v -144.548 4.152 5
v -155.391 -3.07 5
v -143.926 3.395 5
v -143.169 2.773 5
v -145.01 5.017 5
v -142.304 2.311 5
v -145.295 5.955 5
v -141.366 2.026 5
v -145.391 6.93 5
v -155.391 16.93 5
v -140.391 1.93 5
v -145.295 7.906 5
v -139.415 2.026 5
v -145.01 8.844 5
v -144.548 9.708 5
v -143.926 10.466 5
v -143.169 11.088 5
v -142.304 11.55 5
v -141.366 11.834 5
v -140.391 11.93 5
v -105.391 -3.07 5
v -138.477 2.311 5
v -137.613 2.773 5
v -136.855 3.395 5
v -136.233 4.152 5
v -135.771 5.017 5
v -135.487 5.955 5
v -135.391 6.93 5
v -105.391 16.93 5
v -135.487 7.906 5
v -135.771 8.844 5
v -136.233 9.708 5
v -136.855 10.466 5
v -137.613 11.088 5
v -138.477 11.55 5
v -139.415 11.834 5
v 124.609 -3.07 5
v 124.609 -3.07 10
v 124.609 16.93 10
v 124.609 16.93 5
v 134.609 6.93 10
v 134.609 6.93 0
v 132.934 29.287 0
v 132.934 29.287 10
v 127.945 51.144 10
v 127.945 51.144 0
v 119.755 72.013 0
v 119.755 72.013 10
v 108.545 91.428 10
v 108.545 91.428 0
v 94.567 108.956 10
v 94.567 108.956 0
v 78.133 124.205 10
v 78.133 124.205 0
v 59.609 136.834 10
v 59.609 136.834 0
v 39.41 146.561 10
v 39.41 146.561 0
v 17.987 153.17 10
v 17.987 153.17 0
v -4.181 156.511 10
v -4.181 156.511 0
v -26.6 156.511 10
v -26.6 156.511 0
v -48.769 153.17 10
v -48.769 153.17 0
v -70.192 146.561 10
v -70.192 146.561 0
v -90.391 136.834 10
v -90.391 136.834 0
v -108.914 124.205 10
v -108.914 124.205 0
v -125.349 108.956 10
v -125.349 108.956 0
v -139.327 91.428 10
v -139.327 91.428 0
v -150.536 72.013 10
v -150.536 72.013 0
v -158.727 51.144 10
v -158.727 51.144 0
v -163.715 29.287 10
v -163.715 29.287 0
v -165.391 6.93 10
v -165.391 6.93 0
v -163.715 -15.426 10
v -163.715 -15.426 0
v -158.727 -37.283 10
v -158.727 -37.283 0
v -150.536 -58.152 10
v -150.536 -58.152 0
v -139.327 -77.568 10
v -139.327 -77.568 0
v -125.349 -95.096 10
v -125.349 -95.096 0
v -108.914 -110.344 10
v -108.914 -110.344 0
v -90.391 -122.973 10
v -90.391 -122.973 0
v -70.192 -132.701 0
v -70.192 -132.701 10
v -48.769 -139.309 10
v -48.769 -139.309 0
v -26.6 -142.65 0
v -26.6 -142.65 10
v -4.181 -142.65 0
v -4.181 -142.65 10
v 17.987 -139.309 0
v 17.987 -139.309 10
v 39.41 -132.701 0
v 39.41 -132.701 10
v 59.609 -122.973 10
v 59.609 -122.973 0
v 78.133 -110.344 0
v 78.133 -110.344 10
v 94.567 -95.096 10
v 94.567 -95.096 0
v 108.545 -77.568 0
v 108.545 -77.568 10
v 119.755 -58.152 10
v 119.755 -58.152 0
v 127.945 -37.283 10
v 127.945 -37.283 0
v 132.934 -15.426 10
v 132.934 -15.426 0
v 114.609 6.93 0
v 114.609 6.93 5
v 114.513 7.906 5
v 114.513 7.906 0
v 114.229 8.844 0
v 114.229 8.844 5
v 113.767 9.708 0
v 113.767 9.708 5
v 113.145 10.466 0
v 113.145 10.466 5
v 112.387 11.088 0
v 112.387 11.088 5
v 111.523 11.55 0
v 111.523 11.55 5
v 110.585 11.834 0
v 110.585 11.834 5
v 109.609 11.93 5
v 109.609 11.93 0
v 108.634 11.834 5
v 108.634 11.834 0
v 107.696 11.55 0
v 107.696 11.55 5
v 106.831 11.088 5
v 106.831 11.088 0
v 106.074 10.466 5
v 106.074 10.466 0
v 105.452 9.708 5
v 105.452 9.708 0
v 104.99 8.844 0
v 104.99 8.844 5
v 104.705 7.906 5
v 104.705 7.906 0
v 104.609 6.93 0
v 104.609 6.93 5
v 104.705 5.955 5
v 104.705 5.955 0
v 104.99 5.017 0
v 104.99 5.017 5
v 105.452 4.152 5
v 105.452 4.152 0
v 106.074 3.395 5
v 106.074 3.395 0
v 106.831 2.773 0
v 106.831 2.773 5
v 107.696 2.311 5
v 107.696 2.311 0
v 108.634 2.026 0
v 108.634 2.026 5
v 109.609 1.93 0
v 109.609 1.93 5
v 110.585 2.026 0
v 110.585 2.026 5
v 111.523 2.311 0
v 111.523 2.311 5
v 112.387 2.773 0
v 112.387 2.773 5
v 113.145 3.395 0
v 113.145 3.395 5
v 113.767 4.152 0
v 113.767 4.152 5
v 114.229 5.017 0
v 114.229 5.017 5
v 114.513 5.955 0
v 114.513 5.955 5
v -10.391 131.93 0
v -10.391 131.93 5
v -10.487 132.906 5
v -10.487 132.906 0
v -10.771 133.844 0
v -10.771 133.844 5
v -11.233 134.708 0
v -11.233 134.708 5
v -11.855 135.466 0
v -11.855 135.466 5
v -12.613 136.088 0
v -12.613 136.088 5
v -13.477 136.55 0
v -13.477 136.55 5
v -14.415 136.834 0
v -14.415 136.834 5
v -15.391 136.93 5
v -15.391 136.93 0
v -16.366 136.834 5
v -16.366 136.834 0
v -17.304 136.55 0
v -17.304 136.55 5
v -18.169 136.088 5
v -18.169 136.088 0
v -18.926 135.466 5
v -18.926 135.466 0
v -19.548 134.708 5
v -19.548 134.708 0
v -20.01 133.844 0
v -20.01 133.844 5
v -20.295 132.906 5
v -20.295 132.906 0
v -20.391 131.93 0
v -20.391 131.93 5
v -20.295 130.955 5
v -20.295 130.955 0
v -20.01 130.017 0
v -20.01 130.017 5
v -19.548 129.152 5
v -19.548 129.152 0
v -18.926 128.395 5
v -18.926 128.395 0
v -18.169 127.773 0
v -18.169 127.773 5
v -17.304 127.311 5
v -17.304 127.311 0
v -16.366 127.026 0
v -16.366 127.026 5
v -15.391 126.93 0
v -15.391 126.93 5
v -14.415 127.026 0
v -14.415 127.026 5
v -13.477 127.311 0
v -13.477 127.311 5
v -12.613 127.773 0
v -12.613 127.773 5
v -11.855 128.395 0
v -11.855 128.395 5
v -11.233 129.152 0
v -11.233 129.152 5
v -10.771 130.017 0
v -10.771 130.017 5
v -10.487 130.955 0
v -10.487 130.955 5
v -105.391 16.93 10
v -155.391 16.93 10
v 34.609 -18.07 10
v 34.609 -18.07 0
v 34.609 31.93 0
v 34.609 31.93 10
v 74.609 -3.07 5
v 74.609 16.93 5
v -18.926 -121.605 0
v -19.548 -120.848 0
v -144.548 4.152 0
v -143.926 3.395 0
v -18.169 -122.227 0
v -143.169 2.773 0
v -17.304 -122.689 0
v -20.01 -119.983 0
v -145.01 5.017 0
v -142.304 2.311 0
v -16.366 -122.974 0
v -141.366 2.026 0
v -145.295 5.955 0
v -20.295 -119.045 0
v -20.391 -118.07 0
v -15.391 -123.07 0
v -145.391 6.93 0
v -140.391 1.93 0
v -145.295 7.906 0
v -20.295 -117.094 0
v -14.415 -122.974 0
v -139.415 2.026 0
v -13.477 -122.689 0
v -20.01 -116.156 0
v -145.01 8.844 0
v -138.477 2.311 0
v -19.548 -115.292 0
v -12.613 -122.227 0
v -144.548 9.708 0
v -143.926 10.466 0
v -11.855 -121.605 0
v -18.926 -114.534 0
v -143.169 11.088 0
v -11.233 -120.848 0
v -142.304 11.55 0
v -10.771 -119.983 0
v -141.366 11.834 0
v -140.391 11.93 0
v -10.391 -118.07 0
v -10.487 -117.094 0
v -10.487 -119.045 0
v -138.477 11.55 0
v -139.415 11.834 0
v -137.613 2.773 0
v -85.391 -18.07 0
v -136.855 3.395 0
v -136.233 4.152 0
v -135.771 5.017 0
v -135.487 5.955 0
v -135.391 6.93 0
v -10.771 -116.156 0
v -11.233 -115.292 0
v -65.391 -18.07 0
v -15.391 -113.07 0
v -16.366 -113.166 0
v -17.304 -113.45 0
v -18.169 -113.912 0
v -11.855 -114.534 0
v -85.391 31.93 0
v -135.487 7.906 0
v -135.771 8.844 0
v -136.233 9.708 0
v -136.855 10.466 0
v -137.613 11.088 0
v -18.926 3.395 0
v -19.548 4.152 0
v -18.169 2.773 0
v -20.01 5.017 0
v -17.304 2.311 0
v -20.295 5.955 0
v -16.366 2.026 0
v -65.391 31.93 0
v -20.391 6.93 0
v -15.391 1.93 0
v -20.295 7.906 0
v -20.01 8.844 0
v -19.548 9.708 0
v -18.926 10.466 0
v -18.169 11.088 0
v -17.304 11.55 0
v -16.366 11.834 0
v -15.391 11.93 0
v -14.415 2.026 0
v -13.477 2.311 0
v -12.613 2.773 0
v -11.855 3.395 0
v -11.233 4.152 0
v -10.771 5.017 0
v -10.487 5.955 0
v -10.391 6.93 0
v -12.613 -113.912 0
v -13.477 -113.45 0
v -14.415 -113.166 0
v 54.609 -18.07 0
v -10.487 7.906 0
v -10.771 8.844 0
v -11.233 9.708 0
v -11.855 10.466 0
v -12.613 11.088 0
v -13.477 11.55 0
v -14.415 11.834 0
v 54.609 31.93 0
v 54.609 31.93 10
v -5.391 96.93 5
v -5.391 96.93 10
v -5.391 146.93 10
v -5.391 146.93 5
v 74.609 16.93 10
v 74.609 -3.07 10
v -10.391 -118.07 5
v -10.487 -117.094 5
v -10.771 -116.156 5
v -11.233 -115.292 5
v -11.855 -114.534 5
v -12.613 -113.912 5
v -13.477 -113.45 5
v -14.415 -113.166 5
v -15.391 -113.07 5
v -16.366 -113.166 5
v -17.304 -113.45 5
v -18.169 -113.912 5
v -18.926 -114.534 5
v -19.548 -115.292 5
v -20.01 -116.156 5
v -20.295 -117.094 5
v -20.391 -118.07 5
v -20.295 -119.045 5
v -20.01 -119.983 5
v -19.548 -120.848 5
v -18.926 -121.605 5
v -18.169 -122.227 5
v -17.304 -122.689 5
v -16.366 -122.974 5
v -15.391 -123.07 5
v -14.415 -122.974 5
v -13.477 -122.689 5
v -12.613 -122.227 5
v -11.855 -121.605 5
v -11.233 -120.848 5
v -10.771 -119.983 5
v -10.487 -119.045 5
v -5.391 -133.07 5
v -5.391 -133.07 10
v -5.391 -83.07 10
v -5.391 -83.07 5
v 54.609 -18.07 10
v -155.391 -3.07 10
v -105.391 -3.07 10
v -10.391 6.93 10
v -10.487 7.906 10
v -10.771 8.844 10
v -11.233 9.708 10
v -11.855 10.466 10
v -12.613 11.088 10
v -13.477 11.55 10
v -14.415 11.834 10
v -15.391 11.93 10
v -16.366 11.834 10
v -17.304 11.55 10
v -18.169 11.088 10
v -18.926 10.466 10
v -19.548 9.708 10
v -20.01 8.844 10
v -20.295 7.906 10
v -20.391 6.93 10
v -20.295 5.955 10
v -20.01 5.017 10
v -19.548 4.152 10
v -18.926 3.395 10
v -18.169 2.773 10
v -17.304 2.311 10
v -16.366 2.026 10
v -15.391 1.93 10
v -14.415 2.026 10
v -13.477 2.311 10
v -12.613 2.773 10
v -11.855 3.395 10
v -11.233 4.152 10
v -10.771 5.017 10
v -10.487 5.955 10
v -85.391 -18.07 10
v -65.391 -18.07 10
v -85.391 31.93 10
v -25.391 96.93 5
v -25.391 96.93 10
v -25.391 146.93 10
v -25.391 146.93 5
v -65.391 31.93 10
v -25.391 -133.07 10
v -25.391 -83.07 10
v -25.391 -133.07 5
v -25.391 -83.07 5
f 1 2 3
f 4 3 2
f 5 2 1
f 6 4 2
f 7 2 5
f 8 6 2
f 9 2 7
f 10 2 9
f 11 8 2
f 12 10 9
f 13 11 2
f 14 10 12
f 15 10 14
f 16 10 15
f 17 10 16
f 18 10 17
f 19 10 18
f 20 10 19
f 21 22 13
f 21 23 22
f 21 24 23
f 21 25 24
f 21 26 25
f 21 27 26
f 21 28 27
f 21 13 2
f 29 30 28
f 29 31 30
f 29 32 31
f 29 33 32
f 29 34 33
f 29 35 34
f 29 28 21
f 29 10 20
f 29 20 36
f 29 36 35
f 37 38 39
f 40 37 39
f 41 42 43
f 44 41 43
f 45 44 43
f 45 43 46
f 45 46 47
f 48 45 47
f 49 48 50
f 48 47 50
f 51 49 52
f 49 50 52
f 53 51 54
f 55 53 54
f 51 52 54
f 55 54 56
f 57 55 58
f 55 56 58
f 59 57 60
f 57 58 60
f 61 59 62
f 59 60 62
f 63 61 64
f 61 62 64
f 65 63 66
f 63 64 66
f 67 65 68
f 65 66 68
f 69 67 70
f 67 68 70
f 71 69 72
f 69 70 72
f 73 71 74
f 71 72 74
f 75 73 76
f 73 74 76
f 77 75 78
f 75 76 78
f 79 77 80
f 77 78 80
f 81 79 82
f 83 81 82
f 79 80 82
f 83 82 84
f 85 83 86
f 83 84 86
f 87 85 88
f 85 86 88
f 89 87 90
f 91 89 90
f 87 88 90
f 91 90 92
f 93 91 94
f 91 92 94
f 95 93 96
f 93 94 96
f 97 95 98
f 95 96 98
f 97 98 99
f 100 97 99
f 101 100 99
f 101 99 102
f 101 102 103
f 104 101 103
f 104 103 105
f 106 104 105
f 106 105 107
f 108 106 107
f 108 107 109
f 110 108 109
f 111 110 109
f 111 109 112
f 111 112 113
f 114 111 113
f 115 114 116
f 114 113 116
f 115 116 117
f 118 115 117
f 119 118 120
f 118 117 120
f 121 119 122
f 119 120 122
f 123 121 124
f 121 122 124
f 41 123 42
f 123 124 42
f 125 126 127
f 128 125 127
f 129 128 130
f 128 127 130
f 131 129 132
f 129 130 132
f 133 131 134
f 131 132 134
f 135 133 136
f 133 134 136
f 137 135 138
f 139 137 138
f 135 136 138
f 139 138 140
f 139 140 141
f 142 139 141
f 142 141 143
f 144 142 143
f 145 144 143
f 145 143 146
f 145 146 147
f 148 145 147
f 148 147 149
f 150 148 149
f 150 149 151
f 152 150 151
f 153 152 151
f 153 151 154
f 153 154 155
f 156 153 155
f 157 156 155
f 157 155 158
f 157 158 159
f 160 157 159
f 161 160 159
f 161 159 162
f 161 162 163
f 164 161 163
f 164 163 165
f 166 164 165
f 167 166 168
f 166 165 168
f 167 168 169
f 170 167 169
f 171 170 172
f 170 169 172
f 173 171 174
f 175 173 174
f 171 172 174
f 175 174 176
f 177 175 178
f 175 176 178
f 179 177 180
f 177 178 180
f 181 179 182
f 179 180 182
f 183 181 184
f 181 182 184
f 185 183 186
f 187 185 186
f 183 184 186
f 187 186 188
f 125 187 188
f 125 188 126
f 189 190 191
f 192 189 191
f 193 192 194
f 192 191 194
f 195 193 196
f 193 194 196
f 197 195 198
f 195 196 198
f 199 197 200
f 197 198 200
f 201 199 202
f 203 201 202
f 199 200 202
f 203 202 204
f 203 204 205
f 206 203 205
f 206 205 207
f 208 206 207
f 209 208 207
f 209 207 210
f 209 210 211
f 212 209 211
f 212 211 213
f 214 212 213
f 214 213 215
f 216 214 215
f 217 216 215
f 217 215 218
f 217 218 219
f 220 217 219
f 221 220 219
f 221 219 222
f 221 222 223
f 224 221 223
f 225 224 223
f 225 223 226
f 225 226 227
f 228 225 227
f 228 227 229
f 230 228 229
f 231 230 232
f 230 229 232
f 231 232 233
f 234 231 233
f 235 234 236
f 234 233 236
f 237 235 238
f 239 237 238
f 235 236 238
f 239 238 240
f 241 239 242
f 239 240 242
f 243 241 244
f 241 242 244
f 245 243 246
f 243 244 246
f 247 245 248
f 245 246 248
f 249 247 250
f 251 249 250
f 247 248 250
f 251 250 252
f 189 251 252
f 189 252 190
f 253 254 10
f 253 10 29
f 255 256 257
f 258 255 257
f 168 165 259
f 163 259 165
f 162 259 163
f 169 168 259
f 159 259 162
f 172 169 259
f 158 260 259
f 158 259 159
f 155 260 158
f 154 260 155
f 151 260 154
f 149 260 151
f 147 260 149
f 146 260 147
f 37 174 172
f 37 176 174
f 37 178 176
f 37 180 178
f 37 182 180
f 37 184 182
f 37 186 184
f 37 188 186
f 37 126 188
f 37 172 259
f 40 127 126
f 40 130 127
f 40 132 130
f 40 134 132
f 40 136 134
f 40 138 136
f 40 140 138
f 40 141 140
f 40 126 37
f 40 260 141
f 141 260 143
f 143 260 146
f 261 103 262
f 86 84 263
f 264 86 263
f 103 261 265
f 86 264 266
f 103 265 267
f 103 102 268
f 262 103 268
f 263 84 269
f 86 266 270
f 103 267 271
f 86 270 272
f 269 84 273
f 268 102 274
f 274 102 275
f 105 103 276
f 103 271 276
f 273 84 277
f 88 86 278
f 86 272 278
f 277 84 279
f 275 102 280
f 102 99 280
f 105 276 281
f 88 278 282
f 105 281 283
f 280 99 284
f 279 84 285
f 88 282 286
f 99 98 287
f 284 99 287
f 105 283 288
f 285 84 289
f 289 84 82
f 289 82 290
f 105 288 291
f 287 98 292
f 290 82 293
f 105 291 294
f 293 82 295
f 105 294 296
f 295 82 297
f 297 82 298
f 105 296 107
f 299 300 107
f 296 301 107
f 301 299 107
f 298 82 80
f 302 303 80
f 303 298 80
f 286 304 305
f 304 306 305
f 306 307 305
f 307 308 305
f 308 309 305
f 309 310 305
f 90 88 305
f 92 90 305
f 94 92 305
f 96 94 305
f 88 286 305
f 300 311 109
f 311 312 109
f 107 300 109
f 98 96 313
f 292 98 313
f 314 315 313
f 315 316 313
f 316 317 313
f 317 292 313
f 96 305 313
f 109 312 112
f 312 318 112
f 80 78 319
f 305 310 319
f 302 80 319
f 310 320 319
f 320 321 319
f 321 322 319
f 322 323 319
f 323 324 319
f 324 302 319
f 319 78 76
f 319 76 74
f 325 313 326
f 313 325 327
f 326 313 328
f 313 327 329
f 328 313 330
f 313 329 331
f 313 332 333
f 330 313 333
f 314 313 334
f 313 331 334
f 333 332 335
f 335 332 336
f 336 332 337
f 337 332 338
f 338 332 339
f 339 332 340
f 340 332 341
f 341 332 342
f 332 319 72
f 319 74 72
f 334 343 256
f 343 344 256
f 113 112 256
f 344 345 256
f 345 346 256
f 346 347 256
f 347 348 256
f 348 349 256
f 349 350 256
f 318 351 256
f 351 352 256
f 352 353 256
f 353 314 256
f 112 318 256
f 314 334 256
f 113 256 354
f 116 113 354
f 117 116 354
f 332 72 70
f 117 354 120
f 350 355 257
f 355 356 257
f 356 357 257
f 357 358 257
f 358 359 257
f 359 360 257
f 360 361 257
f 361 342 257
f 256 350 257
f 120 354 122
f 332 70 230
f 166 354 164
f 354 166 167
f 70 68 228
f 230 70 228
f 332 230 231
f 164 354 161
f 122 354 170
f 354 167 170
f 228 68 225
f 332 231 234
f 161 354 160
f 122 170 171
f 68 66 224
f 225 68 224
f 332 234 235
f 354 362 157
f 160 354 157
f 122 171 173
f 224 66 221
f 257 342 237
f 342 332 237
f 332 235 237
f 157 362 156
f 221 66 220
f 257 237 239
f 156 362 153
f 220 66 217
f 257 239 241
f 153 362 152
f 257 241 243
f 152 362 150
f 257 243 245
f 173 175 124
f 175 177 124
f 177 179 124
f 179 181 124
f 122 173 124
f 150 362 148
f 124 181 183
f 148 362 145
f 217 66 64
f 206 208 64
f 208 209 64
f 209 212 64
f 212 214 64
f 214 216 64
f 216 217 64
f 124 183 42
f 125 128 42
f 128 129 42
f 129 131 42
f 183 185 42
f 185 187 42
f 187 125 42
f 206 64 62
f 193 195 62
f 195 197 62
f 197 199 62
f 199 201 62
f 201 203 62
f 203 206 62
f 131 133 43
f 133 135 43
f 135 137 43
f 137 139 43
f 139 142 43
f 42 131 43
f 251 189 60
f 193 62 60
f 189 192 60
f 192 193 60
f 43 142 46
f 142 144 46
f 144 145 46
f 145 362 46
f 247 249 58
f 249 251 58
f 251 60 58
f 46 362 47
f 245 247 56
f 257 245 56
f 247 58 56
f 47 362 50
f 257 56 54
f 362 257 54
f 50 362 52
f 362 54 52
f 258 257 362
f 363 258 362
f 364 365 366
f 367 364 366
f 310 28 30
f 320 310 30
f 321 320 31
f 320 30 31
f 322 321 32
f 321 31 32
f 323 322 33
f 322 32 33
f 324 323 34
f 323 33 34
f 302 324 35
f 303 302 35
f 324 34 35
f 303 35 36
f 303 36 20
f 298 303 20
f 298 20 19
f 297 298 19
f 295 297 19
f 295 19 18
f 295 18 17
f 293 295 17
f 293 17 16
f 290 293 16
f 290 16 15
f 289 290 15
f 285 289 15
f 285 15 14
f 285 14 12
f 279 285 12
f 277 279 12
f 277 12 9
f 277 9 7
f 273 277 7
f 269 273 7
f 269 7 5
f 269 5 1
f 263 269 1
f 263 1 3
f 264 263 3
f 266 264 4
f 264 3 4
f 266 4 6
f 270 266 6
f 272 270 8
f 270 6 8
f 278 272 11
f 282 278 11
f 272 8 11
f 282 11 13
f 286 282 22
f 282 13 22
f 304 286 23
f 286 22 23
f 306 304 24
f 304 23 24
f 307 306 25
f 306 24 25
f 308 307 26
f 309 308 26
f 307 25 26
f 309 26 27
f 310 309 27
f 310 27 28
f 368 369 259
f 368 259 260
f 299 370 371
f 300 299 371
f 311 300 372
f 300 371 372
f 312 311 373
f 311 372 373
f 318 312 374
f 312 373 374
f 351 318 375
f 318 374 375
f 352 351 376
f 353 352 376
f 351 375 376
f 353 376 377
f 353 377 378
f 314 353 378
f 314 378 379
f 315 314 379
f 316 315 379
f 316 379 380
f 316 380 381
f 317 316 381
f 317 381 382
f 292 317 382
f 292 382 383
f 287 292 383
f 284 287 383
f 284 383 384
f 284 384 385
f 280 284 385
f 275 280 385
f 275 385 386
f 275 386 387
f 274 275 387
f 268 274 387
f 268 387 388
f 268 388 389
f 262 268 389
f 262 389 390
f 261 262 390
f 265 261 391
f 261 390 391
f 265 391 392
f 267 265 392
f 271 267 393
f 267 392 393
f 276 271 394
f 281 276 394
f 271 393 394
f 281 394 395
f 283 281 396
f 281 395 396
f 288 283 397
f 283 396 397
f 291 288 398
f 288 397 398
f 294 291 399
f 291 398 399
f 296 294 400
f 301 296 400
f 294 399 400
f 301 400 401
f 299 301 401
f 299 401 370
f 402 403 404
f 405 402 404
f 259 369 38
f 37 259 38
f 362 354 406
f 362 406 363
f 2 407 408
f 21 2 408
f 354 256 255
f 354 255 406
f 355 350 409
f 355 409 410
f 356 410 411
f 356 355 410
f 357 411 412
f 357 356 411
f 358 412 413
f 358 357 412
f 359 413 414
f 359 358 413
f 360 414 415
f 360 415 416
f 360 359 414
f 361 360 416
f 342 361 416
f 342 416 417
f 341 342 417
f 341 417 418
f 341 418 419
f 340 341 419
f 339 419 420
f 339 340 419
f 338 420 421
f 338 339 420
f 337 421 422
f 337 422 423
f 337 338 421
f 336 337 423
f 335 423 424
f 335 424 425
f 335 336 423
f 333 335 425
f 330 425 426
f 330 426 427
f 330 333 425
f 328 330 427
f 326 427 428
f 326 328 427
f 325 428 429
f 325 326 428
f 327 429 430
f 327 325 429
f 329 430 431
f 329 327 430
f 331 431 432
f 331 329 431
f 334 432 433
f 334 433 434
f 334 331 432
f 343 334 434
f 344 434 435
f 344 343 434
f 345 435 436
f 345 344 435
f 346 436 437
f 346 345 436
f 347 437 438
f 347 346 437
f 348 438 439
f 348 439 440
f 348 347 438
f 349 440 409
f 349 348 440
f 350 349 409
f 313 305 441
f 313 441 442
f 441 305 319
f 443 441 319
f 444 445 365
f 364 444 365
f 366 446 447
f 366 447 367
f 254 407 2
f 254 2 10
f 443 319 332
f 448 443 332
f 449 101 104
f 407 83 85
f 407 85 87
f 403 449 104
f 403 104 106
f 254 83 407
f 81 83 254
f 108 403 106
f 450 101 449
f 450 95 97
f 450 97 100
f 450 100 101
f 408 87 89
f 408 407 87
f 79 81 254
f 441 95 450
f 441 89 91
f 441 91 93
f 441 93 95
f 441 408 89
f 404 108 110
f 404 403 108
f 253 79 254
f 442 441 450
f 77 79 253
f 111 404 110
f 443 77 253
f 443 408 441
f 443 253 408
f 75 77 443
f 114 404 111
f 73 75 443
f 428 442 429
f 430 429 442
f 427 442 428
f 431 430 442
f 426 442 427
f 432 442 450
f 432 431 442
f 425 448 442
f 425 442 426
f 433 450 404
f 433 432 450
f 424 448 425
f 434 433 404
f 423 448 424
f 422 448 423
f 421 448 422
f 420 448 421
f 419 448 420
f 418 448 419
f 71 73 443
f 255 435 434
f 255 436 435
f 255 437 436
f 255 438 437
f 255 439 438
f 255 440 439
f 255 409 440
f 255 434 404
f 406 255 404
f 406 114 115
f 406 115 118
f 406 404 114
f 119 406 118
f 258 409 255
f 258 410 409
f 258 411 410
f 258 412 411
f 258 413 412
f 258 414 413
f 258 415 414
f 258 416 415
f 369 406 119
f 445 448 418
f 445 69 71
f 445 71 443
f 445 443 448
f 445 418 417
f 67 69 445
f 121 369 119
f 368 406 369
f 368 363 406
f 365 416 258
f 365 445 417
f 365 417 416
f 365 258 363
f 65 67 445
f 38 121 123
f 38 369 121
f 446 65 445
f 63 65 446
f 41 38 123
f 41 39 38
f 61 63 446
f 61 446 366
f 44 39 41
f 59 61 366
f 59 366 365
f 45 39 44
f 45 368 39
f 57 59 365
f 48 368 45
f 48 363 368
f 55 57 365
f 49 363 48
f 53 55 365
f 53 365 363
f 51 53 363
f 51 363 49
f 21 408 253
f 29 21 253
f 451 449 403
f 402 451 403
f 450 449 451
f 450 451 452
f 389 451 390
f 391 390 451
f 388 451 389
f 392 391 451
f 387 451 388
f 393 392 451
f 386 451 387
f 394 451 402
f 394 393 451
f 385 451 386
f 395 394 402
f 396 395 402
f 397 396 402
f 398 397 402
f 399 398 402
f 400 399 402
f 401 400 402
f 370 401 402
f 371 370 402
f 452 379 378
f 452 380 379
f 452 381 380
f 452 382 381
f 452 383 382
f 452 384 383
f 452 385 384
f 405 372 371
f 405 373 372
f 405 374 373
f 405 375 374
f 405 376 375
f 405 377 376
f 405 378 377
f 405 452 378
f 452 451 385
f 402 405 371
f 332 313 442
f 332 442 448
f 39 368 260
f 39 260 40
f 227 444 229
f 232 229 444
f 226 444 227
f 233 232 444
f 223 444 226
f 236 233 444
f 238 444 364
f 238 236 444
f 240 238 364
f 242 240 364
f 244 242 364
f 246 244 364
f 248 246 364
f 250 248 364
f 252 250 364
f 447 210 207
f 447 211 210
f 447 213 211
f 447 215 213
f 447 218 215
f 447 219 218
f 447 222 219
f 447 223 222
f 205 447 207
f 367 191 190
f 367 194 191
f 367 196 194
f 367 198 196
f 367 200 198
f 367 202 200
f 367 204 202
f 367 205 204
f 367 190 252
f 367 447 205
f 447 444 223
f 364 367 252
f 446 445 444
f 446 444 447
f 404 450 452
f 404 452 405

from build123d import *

# Parameters (mm, degrees)
SKETCH_1_R               = 150
SKETCH_1_R_2             = 5
EXTRUDE_1_DEPTH          = 10
SKETCH_2_W               = 50
SKETCH_2_H               = 20
SKETCH_2_W_2             = 20
SKETCH_2_H_2             = 50
CUT_EXTRUDE_1_DEPTH      = 5
SKETCH_4_R               = 5
CUT_EXTRUDE_3_DEPTH      = 229.048761054
CUT_EXTRUDE_4_DEPTH      = 229.213140327
CUT_EXTRUDE_4_DEPTH_BACK = 229.213140327
SKETCH_3_W               = 20
SKETCH_3_H               = 50


with BuildPart() as part:
    # 草图1 → 凸台-拉伸1 (new body)
    with BuildSketch(Plane.XY):
        with Locations((-15.39076342, 6.930343762)):
            Circle(SKETCH_1_R)
        with Locations((-15.39076342, 6.930343762)):
            Circle(SKETCH_1_R_2, mode=Mode.SUBTRACT)
    extrude(amount=EXTRUDE_1_DEPTH)

    # 草图2 → 切除-拉伸1 (cut)
    with BuildSketch(Plane.XY.offset(10)):
        with Locations((99.60923658, 6.930343762)):
            Rectangle(SKETCH_2_W, SKETCH_2_H)
        with Locations((-15.39076342, 121.930343762)):
            Rectangle(SKETCH_2_W_2, SKETCH_2_H_2)
        with Locations((-15.39076342, -108.069656238)):
            Rectangle(SKETCH_2_W_2, SKETCH_2_H_2)
        with Locations((-130.39076342, 6.930343762)):
            Rectangle(SKETCH_2_W, SKETCH_2_H)
    extrude(amount=-CUT_EXTRUDE_1_DEPTH, mode=Mode.SUBTRACT)

    # 草图4 → 切除-拉伸3 (cut, through all)
    with BuildSketch(Plane.XY.offset(5)):
        with Locations((109.60923658, 6.930343762)):
            Circle(SKETCH_4_R)
        with Locations((-15.39076342, -118.069656238)):
            Circle(SKETCH_4_R)
        with Locations((-140.39076342, 6.930343762)):
            Circle(SKETCH_4_R)
        with Locations((-15.39076342, 131.930343762)):
            Circle(SKETCH_4_R)
    extrude(amount=-CUT_EXTRUDE_3_DEPTH, mode=Mode.SUBTRACT)

    # 草图3 → 切除-拉伸4 (cut, two sides: drawn at the far end of the back side and taken through both)
    with BuildSketch(Plane.XY.offset(10).offset(-CUT_EXTRUDE_4_DEPTH_BACK)):
        with Locations((44.60923658, 6.930343762)):
            Rectangle(SKETCH_3_W, SKETCH_3_H)
        with Locations((-75.39076342, 6.930343762)):
            Rectangle(SKETCH_3_W, SKETCH_3_H)
    extrude(amount=CUT_EXTRUDE_4_DEPTH + CUT_EXTRUDE_4_DEPTH_BACK, mode=Mode.SUBTRACT)


solid = part.part
